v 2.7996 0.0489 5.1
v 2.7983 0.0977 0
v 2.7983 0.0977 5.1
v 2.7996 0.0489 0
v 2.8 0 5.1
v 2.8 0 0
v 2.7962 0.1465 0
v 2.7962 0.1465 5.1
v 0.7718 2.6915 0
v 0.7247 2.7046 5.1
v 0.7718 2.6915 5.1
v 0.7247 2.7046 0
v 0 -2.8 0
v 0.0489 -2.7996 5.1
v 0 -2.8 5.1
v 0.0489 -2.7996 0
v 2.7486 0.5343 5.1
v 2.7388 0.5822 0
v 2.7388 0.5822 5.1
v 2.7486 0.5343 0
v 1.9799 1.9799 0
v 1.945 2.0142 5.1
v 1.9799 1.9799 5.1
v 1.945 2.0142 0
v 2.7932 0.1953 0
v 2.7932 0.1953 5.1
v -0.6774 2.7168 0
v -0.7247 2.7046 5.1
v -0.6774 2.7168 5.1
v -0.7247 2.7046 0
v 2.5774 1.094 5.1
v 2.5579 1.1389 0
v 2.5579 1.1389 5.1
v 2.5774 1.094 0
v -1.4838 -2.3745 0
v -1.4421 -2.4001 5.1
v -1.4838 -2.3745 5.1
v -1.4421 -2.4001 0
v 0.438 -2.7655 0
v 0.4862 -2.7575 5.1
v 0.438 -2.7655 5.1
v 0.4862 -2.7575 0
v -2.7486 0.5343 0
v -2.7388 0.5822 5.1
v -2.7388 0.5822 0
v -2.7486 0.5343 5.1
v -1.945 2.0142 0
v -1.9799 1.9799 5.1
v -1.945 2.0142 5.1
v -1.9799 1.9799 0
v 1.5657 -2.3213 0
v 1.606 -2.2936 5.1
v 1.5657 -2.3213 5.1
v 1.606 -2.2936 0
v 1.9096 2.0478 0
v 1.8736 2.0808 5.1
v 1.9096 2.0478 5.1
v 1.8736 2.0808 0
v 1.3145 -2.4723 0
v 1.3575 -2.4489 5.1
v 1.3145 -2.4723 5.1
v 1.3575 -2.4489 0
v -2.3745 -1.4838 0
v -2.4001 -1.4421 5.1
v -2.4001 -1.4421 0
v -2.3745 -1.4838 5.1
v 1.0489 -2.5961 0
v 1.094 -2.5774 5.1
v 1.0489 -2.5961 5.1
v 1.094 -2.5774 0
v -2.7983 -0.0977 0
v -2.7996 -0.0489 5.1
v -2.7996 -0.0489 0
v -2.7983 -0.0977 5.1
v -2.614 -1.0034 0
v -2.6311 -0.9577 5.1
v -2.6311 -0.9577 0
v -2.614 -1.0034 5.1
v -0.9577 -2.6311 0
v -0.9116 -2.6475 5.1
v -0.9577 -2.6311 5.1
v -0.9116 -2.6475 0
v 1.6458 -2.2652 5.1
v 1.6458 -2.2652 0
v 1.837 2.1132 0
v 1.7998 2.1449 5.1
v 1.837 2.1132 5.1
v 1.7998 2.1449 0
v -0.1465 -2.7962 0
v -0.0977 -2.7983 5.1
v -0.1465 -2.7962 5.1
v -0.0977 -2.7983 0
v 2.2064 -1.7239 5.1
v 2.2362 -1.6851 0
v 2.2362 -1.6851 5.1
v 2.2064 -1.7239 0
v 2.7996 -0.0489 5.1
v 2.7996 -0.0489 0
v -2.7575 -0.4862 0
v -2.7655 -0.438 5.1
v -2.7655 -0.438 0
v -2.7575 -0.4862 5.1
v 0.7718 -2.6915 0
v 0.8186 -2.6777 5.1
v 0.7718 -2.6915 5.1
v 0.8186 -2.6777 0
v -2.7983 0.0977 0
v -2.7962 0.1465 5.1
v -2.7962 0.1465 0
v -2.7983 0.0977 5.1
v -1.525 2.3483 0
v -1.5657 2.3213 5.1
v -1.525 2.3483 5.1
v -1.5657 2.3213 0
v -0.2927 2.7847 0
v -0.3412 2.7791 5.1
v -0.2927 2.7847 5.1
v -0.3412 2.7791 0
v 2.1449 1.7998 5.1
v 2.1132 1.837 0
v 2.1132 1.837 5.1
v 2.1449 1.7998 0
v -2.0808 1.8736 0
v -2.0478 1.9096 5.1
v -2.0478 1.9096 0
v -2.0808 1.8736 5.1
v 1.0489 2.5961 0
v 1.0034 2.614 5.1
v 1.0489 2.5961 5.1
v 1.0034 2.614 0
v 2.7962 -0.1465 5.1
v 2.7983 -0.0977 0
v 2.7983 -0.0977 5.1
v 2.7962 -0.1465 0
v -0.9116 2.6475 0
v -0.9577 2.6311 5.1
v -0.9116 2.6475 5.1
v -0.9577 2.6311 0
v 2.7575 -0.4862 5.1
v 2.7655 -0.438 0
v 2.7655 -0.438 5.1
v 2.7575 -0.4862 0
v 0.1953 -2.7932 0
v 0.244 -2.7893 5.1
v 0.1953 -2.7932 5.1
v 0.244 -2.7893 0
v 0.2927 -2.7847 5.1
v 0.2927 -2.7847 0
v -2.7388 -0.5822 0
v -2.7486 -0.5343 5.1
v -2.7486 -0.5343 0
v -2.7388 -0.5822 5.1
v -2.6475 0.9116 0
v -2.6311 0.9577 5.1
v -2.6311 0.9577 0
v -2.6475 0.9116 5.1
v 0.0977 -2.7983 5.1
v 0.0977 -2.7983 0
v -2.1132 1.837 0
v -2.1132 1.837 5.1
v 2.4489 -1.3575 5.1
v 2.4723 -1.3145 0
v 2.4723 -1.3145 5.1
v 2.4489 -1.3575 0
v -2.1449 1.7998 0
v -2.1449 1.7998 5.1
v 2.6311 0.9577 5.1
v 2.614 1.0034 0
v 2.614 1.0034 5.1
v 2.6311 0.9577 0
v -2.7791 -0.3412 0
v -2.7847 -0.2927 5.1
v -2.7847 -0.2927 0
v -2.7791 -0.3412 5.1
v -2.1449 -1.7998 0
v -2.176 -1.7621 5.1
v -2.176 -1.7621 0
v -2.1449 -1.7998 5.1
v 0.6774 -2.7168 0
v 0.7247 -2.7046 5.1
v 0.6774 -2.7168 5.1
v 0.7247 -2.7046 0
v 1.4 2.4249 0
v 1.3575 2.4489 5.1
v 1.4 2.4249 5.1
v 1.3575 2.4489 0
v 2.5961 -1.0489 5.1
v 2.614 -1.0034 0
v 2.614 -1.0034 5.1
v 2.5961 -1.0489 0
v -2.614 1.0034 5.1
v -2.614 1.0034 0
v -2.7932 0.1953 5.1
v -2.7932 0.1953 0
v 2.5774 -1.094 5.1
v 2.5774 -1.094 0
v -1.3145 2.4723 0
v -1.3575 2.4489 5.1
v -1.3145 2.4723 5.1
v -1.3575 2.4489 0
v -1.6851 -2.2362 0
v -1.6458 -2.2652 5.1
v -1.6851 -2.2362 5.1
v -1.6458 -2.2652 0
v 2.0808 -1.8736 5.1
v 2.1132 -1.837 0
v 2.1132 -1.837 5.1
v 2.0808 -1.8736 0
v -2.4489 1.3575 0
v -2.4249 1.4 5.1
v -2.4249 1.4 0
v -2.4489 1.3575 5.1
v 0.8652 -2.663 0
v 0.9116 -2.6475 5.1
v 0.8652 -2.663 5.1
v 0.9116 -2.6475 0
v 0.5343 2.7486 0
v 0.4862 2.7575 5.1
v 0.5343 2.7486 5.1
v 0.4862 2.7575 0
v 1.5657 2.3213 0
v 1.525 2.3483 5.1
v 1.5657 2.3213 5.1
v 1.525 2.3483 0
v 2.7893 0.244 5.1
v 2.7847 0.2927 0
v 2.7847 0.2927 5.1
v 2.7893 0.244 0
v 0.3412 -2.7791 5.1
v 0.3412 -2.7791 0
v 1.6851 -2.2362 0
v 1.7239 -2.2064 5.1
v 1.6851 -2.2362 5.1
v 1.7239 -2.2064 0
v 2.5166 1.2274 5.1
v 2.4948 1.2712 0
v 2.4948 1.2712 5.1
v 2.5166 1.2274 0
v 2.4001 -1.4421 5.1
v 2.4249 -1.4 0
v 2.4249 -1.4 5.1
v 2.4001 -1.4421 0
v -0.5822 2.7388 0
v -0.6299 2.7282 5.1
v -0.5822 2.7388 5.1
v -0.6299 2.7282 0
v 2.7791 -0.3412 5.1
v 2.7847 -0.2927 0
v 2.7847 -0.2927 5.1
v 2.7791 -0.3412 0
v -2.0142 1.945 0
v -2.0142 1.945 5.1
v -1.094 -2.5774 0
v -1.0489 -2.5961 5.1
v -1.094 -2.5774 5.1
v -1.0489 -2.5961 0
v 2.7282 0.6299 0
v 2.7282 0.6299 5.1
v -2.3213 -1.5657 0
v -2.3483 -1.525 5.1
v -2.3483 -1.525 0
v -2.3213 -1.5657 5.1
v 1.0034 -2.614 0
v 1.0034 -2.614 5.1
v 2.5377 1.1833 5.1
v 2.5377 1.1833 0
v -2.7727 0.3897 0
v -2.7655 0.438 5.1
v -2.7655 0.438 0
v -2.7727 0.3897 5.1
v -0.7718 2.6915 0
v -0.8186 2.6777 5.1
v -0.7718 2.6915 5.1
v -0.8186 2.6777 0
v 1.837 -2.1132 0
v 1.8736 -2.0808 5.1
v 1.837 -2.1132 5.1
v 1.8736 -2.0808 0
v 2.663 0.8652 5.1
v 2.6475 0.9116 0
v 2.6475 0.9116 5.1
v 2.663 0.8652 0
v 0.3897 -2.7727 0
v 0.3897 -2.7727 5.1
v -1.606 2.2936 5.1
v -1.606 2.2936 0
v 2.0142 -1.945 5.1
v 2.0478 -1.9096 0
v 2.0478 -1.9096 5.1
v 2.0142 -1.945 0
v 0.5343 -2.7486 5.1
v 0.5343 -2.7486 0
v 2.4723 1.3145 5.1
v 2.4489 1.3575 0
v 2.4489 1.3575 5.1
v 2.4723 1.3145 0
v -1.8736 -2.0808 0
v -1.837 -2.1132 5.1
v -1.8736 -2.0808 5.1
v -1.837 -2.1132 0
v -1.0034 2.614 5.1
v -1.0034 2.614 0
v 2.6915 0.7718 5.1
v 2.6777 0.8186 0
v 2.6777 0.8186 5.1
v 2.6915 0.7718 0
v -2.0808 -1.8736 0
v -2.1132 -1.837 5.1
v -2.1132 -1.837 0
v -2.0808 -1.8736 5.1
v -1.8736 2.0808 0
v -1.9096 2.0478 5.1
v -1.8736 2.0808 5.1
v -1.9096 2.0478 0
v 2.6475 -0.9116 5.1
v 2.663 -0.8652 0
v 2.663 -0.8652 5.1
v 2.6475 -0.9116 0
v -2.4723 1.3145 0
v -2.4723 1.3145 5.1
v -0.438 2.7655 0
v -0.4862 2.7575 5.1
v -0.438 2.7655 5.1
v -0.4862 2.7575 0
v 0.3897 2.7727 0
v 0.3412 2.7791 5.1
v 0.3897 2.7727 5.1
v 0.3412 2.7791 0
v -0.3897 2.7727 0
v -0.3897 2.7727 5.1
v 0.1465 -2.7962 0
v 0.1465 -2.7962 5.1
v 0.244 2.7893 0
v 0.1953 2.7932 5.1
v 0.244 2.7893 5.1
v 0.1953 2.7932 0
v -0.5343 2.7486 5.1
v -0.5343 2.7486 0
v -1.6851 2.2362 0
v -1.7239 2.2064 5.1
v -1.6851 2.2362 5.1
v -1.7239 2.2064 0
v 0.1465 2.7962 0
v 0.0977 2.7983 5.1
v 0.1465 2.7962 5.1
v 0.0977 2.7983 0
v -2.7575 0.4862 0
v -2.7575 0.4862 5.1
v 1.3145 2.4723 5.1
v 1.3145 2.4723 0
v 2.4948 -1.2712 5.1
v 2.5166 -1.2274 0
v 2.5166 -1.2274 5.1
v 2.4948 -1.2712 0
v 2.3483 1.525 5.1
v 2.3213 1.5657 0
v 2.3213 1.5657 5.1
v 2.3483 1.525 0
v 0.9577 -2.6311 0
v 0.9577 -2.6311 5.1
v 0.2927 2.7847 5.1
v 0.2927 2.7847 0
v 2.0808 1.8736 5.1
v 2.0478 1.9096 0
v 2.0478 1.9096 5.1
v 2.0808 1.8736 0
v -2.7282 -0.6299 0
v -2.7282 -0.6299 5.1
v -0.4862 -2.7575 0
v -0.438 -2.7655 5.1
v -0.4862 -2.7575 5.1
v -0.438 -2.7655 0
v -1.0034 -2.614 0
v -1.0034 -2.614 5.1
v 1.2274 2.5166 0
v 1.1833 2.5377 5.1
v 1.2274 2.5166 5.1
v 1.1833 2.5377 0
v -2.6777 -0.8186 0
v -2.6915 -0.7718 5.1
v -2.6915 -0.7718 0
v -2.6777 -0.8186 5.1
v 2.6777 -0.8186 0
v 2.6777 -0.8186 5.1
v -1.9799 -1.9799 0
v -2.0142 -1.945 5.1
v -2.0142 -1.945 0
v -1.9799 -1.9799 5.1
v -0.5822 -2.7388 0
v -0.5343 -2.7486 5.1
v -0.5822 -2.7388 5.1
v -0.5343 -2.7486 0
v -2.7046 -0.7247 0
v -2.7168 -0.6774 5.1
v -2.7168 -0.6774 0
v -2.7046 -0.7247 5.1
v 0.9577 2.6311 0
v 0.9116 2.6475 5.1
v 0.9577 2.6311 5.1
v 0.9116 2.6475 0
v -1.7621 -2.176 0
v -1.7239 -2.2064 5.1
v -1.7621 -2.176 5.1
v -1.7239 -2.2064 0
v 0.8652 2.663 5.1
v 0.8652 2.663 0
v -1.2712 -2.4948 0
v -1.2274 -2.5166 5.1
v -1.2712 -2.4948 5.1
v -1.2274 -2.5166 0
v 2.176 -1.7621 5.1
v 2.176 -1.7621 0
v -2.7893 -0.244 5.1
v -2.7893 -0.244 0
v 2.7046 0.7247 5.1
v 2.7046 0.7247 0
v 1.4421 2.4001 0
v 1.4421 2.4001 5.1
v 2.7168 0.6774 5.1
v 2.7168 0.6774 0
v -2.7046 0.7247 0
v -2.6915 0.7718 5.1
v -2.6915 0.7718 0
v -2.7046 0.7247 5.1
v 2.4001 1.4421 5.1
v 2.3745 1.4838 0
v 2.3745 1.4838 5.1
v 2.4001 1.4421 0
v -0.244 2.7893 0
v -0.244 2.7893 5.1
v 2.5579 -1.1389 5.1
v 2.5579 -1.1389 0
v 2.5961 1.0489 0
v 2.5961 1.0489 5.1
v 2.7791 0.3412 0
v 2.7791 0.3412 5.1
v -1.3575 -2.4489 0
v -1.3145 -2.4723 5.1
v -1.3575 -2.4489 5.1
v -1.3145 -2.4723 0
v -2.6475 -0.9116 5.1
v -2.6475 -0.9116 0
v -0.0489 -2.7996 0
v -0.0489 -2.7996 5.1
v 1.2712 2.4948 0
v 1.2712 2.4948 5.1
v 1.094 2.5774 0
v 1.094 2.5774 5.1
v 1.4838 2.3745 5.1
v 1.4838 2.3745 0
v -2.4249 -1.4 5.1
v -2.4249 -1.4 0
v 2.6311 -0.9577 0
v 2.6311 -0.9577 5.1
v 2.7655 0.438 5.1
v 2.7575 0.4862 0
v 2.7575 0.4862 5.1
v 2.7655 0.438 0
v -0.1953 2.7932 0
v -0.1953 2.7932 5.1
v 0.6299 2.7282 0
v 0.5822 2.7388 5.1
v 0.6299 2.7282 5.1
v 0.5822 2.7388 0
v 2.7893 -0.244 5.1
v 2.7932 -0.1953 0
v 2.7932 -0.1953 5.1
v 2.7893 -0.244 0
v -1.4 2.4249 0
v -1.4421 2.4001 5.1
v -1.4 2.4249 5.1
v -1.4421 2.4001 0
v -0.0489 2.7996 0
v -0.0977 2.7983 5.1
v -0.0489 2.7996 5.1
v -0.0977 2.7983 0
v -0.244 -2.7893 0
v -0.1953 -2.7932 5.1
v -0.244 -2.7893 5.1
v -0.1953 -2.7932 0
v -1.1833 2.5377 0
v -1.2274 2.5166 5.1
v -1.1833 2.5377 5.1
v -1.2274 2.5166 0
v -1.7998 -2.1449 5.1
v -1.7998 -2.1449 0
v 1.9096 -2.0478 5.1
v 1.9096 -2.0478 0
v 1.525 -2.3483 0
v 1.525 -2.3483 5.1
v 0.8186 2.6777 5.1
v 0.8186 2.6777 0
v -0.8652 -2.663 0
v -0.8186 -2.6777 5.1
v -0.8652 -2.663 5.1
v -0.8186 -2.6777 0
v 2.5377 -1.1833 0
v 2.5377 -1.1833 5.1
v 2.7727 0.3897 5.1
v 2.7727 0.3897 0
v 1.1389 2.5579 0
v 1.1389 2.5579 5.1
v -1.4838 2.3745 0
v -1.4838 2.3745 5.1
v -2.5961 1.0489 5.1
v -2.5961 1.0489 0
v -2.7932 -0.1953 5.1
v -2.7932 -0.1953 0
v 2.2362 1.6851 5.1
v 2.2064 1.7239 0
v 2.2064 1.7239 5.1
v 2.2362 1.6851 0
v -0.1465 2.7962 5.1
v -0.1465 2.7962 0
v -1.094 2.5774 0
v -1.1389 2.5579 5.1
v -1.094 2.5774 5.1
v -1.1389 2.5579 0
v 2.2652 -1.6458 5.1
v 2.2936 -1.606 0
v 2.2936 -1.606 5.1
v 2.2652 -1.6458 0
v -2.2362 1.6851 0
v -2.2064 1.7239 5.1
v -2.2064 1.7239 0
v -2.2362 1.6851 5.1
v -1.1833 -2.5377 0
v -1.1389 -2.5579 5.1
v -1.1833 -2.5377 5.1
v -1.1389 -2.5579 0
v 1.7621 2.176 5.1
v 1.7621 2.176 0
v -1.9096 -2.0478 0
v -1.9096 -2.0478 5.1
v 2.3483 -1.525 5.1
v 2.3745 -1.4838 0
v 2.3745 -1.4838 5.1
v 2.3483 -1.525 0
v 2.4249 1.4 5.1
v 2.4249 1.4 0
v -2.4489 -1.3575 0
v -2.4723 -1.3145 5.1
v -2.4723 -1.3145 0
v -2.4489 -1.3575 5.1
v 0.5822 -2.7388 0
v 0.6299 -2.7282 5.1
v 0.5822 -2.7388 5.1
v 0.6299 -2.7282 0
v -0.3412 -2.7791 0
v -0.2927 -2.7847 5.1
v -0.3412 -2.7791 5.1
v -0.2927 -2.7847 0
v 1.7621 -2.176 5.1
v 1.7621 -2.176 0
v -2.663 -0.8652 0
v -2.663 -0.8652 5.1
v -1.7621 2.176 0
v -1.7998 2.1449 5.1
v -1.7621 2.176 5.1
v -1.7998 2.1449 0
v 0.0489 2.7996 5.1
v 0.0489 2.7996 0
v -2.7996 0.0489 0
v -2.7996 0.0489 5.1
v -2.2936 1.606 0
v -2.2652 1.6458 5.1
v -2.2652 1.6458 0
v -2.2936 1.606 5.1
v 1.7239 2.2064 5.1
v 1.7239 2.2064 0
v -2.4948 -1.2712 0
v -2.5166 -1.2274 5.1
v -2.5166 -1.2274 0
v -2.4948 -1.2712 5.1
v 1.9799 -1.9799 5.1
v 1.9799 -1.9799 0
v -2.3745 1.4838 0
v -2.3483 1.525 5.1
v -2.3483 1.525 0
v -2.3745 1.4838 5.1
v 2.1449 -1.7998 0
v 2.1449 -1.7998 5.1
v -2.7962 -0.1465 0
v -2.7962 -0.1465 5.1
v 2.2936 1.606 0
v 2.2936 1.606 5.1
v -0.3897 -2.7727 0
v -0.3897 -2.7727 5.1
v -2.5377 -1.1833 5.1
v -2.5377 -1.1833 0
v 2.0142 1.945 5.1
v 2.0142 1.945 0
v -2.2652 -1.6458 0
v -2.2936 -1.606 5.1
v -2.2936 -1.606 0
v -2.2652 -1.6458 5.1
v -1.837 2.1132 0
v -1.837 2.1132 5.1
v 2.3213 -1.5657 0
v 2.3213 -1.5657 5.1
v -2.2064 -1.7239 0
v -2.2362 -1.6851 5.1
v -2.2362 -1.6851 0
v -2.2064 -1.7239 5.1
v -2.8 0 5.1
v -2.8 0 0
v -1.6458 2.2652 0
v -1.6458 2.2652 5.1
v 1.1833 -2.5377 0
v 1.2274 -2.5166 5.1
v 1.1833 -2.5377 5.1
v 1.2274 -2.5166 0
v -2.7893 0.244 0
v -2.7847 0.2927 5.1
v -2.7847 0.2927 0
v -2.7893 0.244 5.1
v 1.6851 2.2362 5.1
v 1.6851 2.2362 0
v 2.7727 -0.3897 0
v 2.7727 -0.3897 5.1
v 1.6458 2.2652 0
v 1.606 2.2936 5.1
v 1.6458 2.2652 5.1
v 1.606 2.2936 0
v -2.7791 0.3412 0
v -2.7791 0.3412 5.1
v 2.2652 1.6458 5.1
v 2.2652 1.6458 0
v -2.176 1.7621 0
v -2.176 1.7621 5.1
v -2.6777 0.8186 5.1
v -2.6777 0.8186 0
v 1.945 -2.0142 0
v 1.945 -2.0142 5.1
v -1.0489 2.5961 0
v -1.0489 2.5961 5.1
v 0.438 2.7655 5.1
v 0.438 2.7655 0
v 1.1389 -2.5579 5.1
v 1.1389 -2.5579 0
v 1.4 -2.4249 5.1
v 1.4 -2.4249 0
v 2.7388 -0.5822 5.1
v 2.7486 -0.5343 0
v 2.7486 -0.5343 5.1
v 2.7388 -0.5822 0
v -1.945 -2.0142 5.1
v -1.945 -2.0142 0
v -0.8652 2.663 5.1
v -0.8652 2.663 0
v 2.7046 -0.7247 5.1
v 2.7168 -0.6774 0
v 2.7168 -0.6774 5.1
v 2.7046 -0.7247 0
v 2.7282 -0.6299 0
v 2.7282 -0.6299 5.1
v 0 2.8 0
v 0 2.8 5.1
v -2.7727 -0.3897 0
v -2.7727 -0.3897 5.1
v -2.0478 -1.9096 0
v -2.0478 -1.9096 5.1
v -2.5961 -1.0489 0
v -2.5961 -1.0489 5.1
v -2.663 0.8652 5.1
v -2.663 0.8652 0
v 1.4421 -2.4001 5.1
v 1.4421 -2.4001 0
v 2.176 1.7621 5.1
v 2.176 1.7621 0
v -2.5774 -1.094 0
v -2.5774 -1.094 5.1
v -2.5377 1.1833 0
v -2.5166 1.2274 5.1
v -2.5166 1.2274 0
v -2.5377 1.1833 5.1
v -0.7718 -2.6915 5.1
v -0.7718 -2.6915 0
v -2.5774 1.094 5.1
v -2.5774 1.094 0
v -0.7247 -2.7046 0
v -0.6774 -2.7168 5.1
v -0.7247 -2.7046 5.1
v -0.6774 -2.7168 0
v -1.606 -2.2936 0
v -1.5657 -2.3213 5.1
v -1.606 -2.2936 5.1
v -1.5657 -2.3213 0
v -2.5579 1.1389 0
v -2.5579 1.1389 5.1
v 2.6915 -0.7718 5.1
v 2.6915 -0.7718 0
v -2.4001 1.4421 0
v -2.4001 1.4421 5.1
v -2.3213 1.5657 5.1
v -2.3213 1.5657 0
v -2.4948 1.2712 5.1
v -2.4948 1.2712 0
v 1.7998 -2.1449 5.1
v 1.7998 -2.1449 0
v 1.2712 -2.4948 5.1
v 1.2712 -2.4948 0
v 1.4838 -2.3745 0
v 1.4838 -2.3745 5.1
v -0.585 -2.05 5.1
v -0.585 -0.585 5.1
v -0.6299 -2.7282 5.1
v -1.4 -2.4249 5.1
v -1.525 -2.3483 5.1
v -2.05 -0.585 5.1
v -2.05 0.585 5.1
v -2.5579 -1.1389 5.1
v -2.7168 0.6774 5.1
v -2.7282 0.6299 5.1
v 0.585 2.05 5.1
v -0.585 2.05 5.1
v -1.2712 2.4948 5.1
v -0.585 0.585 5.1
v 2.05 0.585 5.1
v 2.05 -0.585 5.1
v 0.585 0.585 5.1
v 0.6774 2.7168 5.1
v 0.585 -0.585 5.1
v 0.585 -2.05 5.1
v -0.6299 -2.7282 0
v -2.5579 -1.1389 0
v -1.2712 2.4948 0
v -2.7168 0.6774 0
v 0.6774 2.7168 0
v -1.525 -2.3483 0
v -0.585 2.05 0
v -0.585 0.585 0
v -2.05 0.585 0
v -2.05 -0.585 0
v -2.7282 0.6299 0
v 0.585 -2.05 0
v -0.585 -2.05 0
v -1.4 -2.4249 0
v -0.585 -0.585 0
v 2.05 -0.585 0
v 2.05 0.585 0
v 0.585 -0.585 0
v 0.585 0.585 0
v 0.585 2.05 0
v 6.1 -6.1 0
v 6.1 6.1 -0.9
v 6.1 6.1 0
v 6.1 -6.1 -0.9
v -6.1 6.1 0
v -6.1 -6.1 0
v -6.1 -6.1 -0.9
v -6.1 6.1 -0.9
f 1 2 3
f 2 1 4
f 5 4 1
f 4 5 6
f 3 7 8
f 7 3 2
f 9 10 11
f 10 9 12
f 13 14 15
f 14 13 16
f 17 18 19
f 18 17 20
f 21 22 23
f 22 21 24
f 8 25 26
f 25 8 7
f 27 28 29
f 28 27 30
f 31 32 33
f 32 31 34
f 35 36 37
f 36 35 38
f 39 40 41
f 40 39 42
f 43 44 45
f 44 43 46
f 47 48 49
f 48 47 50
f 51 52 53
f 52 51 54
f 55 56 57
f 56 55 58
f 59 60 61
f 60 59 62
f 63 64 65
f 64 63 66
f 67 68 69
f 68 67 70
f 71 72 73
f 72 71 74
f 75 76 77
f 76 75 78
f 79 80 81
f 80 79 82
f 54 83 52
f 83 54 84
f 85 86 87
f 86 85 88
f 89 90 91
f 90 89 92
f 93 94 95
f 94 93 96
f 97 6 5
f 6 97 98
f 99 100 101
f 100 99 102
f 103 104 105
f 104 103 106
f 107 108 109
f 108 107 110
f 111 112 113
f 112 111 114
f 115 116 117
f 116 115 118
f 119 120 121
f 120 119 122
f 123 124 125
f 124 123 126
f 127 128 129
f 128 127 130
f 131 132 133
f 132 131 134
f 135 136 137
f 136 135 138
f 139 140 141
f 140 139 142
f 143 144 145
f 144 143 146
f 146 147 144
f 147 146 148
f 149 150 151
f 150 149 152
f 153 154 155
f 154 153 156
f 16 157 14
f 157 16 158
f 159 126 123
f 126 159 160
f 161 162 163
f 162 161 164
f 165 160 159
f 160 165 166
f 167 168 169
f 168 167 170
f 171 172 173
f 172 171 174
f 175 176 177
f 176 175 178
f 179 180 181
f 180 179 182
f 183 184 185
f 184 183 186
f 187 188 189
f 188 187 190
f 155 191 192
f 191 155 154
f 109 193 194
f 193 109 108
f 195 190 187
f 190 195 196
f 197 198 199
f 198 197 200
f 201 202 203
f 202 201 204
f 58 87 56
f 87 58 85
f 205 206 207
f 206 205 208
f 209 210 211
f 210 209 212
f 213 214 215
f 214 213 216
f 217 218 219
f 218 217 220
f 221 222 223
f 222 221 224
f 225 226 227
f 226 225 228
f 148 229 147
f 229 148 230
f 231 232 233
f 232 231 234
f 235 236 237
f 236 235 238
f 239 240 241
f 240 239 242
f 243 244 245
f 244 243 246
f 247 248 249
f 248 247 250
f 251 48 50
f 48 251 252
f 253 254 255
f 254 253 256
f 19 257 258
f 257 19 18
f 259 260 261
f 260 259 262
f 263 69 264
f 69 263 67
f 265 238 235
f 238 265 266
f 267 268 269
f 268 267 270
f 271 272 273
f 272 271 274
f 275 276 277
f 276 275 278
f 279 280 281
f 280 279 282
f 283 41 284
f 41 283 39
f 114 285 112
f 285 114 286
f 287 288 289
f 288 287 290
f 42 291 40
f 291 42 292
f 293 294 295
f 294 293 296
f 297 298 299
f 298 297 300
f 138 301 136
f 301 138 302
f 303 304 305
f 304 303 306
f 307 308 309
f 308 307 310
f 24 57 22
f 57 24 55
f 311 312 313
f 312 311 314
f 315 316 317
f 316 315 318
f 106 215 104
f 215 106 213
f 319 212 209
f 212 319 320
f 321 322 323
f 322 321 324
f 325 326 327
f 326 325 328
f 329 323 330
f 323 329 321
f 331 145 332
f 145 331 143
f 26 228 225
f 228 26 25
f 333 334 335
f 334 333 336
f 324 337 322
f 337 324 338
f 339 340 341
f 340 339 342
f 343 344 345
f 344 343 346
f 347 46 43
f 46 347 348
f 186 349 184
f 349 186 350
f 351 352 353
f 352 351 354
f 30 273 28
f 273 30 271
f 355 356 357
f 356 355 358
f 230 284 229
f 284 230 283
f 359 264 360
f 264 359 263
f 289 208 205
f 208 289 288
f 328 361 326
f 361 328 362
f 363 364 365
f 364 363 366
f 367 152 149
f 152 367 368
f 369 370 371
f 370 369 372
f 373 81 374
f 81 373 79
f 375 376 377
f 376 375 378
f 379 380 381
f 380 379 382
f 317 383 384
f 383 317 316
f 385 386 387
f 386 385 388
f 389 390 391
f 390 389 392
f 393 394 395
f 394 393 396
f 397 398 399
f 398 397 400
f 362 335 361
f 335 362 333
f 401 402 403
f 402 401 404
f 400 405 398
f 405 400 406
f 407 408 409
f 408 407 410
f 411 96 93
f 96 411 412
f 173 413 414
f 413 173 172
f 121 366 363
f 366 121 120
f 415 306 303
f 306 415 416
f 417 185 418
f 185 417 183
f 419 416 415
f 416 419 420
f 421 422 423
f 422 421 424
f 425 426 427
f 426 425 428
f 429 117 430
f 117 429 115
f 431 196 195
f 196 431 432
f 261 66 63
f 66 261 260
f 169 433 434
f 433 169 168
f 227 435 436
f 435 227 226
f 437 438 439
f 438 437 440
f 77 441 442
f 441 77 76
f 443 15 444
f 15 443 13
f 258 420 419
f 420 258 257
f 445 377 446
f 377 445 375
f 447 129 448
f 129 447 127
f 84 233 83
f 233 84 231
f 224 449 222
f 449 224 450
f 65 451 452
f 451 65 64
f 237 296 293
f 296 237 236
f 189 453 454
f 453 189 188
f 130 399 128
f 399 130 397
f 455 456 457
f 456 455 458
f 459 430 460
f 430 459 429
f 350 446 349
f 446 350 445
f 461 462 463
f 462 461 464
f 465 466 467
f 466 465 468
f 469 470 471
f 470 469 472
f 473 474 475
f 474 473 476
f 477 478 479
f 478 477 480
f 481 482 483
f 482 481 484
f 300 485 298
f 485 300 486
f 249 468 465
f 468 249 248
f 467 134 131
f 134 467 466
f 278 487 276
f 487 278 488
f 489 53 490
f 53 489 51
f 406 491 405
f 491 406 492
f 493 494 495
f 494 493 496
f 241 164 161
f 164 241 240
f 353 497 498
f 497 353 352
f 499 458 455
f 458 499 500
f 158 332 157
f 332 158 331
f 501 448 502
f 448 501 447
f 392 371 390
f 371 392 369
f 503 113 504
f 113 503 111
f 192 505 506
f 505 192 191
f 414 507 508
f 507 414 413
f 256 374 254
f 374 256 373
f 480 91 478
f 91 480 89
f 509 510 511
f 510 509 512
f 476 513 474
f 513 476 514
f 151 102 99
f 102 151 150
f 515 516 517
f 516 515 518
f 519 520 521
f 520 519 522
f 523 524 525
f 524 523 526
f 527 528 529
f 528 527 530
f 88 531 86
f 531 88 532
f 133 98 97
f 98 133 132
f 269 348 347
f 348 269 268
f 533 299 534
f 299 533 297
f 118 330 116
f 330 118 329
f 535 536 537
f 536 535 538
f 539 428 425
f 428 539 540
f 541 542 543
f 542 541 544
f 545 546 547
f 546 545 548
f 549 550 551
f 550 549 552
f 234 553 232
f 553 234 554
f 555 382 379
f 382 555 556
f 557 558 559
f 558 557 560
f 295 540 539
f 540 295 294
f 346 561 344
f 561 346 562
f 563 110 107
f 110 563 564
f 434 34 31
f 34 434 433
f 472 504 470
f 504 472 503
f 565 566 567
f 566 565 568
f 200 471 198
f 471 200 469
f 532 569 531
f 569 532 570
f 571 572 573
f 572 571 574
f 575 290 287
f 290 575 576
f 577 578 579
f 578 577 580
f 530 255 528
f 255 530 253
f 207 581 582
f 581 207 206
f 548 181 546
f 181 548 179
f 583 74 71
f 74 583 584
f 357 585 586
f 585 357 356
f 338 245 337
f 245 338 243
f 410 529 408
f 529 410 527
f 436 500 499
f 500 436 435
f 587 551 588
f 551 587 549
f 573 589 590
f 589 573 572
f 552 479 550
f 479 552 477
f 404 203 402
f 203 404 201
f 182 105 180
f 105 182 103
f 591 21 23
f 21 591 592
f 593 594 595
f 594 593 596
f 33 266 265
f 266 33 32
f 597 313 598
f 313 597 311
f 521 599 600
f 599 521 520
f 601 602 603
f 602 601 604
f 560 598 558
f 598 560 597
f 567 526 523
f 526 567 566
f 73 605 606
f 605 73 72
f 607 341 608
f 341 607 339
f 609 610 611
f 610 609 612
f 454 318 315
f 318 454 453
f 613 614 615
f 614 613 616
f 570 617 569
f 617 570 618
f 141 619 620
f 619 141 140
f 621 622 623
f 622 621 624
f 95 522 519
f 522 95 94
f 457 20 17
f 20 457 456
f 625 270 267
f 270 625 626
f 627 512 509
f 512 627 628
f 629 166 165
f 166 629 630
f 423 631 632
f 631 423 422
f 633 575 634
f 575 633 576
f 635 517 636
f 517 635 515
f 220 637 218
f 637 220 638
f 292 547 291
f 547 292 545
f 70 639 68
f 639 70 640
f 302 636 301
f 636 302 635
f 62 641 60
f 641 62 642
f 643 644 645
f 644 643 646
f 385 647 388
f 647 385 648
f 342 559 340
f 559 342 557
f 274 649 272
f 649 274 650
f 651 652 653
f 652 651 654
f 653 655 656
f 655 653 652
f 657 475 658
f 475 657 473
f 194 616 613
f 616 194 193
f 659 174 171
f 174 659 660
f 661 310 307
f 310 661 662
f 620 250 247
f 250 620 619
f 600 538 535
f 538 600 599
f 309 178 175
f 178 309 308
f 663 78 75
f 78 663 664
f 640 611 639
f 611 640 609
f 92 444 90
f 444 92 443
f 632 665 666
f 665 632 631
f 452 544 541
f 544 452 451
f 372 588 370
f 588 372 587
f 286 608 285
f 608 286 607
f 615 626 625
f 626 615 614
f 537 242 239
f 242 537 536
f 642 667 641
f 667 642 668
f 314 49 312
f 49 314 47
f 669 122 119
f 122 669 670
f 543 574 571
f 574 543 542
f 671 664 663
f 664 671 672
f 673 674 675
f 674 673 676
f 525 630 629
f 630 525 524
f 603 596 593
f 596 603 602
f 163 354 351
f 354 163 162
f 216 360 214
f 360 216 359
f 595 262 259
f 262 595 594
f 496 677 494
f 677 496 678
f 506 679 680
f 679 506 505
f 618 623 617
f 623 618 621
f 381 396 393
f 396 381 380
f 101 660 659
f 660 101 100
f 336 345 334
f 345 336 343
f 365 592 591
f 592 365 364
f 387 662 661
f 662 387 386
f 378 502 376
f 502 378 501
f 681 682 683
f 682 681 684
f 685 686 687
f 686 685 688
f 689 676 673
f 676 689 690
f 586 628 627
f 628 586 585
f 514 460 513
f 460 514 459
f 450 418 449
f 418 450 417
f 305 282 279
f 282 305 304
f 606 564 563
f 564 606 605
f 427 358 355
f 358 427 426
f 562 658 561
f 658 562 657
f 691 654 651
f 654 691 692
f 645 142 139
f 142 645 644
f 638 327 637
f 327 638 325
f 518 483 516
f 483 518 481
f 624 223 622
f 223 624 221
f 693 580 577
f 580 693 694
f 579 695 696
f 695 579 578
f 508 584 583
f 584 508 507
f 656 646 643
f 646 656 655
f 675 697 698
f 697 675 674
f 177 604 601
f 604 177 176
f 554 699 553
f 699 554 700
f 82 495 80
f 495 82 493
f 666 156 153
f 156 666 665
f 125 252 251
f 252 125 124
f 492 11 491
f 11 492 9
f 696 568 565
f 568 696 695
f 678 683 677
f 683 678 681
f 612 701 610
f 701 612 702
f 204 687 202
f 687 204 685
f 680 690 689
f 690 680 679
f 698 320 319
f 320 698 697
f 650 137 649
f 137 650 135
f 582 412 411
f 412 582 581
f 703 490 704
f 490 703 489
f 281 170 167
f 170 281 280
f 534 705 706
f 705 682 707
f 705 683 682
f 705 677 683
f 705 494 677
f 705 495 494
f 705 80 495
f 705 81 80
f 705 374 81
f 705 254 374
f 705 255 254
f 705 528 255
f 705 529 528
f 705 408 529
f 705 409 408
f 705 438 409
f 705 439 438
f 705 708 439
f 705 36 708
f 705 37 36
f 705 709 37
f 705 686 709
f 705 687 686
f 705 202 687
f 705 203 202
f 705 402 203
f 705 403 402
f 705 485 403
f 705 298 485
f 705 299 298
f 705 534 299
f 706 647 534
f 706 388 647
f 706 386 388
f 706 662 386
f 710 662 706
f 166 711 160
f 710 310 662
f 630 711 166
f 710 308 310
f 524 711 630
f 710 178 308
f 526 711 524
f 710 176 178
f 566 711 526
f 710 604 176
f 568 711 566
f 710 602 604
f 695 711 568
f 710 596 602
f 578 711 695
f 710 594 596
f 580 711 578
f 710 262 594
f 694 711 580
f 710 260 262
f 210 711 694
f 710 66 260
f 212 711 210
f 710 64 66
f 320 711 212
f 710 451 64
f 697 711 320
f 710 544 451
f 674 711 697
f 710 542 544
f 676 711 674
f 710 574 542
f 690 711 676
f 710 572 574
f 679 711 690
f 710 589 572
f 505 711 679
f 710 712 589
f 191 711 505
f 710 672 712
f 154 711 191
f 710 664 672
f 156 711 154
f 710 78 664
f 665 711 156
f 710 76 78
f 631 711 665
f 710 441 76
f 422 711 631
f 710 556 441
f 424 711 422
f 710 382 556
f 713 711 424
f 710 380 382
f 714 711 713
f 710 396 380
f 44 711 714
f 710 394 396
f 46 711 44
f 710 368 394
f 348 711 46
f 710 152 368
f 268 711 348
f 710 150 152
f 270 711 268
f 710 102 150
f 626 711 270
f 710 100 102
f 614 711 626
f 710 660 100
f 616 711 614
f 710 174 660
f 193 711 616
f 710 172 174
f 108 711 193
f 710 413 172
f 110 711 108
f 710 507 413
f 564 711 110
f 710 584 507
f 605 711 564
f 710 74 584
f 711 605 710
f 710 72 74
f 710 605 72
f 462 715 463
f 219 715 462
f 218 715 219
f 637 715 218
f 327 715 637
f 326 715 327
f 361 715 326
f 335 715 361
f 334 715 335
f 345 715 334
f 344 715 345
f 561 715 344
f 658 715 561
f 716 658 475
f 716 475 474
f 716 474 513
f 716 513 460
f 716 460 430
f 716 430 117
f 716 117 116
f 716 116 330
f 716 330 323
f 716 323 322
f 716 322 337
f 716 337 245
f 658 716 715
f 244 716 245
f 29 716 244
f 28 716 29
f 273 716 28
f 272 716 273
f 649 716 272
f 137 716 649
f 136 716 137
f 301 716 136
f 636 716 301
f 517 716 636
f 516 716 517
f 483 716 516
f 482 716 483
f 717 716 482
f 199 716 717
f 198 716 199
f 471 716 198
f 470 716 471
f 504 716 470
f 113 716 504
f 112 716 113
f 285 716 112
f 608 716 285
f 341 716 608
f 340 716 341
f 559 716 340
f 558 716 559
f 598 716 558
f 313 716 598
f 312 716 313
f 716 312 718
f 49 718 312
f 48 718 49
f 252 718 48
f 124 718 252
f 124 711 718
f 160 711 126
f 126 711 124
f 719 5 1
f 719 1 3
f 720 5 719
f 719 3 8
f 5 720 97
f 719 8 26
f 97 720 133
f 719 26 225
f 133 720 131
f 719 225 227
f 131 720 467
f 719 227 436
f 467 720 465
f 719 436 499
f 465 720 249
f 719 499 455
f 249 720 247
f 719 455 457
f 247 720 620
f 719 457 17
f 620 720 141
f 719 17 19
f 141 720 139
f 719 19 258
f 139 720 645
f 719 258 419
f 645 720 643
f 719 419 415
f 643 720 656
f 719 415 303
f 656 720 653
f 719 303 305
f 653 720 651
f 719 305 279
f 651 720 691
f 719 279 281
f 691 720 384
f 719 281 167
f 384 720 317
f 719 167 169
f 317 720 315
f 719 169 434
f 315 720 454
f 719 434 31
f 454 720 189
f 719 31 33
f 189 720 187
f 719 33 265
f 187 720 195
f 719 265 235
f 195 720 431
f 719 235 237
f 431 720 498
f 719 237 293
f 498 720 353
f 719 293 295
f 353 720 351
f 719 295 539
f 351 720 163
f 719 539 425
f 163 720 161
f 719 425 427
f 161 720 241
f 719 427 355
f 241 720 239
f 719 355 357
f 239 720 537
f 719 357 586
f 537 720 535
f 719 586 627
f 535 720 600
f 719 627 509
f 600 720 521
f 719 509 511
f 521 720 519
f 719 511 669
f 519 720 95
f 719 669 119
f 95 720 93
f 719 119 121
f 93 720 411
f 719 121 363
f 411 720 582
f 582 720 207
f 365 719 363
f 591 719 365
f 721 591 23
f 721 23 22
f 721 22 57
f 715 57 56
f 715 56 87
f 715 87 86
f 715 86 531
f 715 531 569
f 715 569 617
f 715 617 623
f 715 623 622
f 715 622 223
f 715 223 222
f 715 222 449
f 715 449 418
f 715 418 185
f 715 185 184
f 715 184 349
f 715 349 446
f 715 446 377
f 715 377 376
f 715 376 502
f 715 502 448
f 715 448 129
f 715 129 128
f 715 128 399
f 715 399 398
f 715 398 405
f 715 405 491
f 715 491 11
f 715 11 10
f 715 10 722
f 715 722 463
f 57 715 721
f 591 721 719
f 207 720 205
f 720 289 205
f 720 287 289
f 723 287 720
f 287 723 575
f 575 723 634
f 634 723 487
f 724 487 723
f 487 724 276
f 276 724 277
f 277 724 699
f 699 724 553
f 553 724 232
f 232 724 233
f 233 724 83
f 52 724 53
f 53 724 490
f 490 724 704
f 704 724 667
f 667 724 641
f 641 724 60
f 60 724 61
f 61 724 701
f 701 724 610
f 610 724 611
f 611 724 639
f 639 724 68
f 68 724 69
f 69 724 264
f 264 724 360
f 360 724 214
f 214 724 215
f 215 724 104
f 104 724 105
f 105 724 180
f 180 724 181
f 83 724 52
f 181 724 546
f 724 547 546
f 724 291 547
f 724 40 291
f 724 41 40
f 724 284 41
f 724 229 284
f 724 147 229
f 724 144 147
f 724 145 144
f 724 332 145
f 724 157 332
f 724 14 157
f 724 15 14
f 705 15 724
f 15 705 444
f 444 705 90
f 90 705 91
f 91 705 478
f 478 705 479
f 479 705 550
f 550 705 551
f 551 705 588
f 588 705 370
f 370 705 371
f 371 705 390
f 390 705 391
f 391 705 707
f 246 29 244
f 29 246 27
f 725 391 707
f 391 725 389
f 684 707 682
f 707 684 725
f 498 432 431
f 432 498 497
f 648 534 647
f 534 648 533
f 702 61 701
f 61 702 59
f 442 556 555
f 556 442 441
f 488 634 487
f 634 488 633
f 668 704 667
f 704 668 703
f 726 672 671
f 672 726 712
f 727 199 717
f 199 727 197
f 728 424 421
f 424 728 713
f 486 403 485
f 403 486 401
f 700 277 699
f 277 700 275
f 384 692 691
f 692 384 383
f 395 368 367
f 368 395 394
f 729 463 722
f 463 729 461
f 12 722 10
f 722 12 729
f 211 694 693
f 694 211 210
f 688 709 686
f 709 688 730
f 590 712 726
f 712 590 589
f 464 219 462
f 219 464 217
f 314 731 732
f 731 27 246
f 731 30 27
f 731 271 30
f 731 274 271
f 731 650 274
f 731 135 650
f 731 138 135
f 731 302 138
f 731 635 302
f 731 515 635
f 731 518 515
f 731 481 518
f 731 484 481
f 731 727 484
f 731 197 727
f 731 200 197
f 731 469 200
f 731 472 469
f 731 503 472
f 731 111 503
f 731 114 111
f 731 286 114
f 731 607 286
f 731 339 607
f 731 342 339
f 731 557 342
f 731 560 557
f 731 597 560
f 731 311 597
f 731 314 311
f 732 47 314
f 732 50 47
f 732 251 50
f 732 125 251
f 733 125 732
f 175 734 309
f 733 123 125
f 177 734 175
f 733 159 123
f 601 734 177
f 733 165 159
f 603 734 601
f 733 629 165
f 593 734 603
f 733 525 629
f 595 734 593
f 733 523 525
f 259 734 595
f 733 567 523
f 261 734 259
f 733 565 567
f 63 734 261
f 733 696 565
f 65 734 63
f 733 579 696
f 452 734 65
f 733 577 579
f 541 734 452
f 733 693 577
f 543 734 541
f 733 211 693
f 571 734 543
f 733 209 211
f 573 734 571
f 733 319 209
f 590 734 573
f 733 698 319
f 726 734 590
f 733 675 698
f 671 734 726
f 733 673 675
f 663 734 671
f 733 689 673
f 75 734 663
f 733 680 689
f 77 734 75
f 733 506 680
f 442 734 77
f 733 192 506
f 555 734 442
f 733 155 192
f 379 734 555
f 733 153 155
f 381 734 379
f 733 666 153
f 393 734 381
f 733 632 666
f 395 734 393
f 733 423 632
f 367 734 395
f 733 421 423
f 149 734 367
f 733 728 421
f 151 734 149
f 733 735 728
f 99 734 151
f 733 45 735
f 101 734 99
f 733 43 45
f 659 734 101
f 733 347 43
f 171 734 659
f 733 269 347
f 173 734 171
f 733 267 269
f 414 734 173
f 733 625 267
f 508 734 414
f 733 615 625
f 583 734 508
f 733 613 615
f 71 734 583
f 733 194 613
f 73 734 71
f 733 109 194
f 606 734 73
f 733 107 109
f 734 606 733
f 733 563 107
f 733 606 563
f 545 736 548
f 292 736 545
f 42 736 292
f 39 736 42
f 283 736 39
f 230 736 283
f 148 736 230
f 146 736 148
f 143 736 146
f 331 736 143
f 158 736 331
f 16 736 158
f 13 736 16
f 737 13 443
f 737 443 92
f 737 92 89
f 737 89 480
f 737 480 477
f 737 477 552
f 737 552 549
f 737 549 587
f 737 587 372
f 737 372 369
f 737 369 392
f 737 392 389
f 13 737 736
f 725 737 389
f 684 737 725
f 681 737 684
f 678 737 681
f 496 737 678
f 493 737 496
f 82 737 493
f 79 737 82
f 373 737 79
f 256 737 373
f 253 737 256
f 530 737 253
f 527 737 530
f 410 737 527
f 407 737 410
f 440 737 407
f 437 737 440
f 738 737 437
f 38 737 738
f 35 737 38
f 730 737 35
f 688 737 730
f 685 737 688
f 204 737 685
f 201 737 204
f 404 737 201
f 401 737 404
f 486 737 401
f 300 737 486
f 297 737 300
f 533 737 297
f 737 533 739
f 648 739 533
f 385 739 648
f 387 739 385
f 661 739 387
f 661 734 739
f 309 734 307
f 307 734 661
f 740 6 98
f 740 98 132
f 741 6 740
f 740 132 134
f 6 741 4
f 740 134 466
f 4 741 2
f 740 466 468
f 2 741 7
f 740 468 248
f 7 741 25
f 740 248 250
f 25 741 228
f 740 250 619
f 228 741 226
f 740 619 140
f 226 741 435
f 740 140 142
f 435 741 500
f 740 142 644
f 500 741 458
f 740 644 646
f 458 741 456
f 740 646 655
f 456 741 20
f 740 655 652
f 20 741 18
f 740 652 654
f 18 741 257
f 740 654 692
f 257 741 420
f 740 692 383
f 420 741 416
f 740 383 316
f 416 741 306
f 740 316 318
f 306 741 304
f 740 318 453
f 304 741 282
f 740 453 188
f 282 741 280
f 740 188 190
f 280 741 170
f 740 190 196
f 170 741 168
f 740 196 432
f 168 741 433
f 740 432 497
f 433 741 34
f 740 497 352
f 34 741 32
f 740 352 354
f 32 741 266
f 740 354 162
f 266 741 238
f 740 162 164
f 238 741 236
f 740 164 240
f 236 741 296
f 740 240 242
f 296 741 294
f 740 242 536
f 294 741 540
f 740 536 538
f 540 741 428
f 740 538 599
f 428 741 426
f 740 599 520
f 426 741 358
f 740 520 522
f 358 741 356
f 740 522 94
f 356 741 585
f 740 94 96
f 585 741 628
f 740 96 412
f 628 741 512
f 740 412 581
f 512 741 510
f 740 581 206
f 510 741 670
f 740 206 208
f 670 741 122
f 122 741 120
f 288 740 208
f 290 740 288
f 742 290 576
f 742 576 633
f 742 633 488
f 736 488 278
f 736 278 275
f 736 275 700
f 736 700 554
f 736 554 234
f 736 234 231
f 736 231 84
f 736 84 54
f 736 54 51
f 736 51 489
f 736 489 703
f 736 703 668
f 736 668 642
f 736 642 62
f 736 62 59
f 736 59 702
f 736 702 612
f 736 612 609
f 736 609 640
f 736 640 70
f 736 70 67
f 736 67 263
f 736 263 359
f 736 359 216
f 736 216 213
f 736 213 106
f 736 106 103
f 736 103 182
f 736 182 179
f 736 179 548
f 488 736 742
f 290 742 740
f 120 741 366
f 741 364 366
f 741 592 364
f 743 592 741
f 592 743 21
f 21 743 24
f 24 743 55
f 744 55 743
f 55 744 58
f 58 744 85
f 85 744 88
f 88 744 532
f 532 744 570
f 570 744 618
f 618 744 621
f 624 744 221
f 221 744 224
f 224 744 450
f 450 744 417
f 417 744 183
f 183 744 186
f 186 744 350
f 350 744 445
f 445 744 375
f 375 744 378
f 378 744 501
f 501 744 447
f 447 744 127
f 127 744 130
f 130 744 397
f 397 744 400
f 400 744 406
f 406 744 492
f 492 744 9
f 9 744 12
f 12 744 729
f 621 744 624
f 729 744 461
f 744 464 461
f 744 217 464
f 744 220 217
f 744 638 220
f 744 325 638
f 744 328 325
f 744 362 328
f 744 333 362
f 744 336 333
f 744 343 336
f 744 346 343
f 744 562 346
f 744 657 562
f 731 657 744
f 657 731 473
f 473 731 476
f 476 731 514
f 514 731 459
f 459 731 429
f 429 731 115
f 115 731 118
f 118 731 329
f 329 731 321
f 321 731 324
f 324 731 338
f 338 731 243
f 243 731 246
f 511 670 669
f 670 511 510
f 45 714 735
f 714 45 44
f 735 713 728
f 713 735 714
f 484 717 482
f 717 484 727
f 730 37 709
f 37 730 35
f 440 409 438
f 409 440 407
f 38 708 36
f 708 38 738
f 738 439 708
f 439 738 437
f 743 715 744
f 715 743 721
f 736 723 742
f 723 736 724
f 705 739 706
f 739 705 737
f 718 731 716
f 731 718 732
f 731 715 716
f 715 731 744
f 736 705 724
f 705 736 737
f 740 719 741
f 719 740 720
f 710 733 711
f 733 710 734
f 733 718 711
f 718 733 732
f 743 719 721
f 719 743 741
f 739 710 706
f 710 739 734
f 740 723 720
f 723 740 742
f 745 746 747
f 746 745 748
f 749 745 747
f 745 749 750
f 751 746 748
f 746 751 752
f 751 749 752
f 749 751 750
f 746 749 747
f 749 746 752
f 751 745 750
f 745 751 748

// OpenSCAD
/**
* based on http://deskthority.net/w/images/c/c8/Cherry_MX_1%C3%971_keycap_specification_%281983%29.pdf
* TODO: find better source, and/or measure several brands.
*
* v.0
* 2014-May-26
*/

baseplate();
mx_mount();

/** a simple plane where to develop the keycap on top of
* NOTE: the depth of 0.95mm... it shouldn't matter because you should build
* your keycap on top of it. If not expanding the geometry with more plastic
* there, but instead using as a base for a wooden keycap cup or some
* other crazy idea, use the minimum your material/printer
* will be comfortable with
*/
module baseplate(){
	translate( [0,0, -0.9/2] )
		cube( size=[12.2,12.2,0.9], center=true );
}

/**
* The female part of the steam.
* NOTE: i'm not 100% sure on the height, as the drawing I found does not have
* it measured... and i can't infer it with full confidence when
* just accounting for the other measurements. the drawing os probably more
* concerned with the keycap per se.
*/
module mx_mount(){
	mx_height = 5.1;
	translate( [0,0,mx_height/2] ){
		difference(){
			cylinder( h=mx_height, r=5.6/2, center=true, $fn=360 );
				cube( size=[1.17,4.1,mx_height+2], center=true );
				cube( size=[4.1,1.17,mx_height+2], center=true );
		}
	}
}
